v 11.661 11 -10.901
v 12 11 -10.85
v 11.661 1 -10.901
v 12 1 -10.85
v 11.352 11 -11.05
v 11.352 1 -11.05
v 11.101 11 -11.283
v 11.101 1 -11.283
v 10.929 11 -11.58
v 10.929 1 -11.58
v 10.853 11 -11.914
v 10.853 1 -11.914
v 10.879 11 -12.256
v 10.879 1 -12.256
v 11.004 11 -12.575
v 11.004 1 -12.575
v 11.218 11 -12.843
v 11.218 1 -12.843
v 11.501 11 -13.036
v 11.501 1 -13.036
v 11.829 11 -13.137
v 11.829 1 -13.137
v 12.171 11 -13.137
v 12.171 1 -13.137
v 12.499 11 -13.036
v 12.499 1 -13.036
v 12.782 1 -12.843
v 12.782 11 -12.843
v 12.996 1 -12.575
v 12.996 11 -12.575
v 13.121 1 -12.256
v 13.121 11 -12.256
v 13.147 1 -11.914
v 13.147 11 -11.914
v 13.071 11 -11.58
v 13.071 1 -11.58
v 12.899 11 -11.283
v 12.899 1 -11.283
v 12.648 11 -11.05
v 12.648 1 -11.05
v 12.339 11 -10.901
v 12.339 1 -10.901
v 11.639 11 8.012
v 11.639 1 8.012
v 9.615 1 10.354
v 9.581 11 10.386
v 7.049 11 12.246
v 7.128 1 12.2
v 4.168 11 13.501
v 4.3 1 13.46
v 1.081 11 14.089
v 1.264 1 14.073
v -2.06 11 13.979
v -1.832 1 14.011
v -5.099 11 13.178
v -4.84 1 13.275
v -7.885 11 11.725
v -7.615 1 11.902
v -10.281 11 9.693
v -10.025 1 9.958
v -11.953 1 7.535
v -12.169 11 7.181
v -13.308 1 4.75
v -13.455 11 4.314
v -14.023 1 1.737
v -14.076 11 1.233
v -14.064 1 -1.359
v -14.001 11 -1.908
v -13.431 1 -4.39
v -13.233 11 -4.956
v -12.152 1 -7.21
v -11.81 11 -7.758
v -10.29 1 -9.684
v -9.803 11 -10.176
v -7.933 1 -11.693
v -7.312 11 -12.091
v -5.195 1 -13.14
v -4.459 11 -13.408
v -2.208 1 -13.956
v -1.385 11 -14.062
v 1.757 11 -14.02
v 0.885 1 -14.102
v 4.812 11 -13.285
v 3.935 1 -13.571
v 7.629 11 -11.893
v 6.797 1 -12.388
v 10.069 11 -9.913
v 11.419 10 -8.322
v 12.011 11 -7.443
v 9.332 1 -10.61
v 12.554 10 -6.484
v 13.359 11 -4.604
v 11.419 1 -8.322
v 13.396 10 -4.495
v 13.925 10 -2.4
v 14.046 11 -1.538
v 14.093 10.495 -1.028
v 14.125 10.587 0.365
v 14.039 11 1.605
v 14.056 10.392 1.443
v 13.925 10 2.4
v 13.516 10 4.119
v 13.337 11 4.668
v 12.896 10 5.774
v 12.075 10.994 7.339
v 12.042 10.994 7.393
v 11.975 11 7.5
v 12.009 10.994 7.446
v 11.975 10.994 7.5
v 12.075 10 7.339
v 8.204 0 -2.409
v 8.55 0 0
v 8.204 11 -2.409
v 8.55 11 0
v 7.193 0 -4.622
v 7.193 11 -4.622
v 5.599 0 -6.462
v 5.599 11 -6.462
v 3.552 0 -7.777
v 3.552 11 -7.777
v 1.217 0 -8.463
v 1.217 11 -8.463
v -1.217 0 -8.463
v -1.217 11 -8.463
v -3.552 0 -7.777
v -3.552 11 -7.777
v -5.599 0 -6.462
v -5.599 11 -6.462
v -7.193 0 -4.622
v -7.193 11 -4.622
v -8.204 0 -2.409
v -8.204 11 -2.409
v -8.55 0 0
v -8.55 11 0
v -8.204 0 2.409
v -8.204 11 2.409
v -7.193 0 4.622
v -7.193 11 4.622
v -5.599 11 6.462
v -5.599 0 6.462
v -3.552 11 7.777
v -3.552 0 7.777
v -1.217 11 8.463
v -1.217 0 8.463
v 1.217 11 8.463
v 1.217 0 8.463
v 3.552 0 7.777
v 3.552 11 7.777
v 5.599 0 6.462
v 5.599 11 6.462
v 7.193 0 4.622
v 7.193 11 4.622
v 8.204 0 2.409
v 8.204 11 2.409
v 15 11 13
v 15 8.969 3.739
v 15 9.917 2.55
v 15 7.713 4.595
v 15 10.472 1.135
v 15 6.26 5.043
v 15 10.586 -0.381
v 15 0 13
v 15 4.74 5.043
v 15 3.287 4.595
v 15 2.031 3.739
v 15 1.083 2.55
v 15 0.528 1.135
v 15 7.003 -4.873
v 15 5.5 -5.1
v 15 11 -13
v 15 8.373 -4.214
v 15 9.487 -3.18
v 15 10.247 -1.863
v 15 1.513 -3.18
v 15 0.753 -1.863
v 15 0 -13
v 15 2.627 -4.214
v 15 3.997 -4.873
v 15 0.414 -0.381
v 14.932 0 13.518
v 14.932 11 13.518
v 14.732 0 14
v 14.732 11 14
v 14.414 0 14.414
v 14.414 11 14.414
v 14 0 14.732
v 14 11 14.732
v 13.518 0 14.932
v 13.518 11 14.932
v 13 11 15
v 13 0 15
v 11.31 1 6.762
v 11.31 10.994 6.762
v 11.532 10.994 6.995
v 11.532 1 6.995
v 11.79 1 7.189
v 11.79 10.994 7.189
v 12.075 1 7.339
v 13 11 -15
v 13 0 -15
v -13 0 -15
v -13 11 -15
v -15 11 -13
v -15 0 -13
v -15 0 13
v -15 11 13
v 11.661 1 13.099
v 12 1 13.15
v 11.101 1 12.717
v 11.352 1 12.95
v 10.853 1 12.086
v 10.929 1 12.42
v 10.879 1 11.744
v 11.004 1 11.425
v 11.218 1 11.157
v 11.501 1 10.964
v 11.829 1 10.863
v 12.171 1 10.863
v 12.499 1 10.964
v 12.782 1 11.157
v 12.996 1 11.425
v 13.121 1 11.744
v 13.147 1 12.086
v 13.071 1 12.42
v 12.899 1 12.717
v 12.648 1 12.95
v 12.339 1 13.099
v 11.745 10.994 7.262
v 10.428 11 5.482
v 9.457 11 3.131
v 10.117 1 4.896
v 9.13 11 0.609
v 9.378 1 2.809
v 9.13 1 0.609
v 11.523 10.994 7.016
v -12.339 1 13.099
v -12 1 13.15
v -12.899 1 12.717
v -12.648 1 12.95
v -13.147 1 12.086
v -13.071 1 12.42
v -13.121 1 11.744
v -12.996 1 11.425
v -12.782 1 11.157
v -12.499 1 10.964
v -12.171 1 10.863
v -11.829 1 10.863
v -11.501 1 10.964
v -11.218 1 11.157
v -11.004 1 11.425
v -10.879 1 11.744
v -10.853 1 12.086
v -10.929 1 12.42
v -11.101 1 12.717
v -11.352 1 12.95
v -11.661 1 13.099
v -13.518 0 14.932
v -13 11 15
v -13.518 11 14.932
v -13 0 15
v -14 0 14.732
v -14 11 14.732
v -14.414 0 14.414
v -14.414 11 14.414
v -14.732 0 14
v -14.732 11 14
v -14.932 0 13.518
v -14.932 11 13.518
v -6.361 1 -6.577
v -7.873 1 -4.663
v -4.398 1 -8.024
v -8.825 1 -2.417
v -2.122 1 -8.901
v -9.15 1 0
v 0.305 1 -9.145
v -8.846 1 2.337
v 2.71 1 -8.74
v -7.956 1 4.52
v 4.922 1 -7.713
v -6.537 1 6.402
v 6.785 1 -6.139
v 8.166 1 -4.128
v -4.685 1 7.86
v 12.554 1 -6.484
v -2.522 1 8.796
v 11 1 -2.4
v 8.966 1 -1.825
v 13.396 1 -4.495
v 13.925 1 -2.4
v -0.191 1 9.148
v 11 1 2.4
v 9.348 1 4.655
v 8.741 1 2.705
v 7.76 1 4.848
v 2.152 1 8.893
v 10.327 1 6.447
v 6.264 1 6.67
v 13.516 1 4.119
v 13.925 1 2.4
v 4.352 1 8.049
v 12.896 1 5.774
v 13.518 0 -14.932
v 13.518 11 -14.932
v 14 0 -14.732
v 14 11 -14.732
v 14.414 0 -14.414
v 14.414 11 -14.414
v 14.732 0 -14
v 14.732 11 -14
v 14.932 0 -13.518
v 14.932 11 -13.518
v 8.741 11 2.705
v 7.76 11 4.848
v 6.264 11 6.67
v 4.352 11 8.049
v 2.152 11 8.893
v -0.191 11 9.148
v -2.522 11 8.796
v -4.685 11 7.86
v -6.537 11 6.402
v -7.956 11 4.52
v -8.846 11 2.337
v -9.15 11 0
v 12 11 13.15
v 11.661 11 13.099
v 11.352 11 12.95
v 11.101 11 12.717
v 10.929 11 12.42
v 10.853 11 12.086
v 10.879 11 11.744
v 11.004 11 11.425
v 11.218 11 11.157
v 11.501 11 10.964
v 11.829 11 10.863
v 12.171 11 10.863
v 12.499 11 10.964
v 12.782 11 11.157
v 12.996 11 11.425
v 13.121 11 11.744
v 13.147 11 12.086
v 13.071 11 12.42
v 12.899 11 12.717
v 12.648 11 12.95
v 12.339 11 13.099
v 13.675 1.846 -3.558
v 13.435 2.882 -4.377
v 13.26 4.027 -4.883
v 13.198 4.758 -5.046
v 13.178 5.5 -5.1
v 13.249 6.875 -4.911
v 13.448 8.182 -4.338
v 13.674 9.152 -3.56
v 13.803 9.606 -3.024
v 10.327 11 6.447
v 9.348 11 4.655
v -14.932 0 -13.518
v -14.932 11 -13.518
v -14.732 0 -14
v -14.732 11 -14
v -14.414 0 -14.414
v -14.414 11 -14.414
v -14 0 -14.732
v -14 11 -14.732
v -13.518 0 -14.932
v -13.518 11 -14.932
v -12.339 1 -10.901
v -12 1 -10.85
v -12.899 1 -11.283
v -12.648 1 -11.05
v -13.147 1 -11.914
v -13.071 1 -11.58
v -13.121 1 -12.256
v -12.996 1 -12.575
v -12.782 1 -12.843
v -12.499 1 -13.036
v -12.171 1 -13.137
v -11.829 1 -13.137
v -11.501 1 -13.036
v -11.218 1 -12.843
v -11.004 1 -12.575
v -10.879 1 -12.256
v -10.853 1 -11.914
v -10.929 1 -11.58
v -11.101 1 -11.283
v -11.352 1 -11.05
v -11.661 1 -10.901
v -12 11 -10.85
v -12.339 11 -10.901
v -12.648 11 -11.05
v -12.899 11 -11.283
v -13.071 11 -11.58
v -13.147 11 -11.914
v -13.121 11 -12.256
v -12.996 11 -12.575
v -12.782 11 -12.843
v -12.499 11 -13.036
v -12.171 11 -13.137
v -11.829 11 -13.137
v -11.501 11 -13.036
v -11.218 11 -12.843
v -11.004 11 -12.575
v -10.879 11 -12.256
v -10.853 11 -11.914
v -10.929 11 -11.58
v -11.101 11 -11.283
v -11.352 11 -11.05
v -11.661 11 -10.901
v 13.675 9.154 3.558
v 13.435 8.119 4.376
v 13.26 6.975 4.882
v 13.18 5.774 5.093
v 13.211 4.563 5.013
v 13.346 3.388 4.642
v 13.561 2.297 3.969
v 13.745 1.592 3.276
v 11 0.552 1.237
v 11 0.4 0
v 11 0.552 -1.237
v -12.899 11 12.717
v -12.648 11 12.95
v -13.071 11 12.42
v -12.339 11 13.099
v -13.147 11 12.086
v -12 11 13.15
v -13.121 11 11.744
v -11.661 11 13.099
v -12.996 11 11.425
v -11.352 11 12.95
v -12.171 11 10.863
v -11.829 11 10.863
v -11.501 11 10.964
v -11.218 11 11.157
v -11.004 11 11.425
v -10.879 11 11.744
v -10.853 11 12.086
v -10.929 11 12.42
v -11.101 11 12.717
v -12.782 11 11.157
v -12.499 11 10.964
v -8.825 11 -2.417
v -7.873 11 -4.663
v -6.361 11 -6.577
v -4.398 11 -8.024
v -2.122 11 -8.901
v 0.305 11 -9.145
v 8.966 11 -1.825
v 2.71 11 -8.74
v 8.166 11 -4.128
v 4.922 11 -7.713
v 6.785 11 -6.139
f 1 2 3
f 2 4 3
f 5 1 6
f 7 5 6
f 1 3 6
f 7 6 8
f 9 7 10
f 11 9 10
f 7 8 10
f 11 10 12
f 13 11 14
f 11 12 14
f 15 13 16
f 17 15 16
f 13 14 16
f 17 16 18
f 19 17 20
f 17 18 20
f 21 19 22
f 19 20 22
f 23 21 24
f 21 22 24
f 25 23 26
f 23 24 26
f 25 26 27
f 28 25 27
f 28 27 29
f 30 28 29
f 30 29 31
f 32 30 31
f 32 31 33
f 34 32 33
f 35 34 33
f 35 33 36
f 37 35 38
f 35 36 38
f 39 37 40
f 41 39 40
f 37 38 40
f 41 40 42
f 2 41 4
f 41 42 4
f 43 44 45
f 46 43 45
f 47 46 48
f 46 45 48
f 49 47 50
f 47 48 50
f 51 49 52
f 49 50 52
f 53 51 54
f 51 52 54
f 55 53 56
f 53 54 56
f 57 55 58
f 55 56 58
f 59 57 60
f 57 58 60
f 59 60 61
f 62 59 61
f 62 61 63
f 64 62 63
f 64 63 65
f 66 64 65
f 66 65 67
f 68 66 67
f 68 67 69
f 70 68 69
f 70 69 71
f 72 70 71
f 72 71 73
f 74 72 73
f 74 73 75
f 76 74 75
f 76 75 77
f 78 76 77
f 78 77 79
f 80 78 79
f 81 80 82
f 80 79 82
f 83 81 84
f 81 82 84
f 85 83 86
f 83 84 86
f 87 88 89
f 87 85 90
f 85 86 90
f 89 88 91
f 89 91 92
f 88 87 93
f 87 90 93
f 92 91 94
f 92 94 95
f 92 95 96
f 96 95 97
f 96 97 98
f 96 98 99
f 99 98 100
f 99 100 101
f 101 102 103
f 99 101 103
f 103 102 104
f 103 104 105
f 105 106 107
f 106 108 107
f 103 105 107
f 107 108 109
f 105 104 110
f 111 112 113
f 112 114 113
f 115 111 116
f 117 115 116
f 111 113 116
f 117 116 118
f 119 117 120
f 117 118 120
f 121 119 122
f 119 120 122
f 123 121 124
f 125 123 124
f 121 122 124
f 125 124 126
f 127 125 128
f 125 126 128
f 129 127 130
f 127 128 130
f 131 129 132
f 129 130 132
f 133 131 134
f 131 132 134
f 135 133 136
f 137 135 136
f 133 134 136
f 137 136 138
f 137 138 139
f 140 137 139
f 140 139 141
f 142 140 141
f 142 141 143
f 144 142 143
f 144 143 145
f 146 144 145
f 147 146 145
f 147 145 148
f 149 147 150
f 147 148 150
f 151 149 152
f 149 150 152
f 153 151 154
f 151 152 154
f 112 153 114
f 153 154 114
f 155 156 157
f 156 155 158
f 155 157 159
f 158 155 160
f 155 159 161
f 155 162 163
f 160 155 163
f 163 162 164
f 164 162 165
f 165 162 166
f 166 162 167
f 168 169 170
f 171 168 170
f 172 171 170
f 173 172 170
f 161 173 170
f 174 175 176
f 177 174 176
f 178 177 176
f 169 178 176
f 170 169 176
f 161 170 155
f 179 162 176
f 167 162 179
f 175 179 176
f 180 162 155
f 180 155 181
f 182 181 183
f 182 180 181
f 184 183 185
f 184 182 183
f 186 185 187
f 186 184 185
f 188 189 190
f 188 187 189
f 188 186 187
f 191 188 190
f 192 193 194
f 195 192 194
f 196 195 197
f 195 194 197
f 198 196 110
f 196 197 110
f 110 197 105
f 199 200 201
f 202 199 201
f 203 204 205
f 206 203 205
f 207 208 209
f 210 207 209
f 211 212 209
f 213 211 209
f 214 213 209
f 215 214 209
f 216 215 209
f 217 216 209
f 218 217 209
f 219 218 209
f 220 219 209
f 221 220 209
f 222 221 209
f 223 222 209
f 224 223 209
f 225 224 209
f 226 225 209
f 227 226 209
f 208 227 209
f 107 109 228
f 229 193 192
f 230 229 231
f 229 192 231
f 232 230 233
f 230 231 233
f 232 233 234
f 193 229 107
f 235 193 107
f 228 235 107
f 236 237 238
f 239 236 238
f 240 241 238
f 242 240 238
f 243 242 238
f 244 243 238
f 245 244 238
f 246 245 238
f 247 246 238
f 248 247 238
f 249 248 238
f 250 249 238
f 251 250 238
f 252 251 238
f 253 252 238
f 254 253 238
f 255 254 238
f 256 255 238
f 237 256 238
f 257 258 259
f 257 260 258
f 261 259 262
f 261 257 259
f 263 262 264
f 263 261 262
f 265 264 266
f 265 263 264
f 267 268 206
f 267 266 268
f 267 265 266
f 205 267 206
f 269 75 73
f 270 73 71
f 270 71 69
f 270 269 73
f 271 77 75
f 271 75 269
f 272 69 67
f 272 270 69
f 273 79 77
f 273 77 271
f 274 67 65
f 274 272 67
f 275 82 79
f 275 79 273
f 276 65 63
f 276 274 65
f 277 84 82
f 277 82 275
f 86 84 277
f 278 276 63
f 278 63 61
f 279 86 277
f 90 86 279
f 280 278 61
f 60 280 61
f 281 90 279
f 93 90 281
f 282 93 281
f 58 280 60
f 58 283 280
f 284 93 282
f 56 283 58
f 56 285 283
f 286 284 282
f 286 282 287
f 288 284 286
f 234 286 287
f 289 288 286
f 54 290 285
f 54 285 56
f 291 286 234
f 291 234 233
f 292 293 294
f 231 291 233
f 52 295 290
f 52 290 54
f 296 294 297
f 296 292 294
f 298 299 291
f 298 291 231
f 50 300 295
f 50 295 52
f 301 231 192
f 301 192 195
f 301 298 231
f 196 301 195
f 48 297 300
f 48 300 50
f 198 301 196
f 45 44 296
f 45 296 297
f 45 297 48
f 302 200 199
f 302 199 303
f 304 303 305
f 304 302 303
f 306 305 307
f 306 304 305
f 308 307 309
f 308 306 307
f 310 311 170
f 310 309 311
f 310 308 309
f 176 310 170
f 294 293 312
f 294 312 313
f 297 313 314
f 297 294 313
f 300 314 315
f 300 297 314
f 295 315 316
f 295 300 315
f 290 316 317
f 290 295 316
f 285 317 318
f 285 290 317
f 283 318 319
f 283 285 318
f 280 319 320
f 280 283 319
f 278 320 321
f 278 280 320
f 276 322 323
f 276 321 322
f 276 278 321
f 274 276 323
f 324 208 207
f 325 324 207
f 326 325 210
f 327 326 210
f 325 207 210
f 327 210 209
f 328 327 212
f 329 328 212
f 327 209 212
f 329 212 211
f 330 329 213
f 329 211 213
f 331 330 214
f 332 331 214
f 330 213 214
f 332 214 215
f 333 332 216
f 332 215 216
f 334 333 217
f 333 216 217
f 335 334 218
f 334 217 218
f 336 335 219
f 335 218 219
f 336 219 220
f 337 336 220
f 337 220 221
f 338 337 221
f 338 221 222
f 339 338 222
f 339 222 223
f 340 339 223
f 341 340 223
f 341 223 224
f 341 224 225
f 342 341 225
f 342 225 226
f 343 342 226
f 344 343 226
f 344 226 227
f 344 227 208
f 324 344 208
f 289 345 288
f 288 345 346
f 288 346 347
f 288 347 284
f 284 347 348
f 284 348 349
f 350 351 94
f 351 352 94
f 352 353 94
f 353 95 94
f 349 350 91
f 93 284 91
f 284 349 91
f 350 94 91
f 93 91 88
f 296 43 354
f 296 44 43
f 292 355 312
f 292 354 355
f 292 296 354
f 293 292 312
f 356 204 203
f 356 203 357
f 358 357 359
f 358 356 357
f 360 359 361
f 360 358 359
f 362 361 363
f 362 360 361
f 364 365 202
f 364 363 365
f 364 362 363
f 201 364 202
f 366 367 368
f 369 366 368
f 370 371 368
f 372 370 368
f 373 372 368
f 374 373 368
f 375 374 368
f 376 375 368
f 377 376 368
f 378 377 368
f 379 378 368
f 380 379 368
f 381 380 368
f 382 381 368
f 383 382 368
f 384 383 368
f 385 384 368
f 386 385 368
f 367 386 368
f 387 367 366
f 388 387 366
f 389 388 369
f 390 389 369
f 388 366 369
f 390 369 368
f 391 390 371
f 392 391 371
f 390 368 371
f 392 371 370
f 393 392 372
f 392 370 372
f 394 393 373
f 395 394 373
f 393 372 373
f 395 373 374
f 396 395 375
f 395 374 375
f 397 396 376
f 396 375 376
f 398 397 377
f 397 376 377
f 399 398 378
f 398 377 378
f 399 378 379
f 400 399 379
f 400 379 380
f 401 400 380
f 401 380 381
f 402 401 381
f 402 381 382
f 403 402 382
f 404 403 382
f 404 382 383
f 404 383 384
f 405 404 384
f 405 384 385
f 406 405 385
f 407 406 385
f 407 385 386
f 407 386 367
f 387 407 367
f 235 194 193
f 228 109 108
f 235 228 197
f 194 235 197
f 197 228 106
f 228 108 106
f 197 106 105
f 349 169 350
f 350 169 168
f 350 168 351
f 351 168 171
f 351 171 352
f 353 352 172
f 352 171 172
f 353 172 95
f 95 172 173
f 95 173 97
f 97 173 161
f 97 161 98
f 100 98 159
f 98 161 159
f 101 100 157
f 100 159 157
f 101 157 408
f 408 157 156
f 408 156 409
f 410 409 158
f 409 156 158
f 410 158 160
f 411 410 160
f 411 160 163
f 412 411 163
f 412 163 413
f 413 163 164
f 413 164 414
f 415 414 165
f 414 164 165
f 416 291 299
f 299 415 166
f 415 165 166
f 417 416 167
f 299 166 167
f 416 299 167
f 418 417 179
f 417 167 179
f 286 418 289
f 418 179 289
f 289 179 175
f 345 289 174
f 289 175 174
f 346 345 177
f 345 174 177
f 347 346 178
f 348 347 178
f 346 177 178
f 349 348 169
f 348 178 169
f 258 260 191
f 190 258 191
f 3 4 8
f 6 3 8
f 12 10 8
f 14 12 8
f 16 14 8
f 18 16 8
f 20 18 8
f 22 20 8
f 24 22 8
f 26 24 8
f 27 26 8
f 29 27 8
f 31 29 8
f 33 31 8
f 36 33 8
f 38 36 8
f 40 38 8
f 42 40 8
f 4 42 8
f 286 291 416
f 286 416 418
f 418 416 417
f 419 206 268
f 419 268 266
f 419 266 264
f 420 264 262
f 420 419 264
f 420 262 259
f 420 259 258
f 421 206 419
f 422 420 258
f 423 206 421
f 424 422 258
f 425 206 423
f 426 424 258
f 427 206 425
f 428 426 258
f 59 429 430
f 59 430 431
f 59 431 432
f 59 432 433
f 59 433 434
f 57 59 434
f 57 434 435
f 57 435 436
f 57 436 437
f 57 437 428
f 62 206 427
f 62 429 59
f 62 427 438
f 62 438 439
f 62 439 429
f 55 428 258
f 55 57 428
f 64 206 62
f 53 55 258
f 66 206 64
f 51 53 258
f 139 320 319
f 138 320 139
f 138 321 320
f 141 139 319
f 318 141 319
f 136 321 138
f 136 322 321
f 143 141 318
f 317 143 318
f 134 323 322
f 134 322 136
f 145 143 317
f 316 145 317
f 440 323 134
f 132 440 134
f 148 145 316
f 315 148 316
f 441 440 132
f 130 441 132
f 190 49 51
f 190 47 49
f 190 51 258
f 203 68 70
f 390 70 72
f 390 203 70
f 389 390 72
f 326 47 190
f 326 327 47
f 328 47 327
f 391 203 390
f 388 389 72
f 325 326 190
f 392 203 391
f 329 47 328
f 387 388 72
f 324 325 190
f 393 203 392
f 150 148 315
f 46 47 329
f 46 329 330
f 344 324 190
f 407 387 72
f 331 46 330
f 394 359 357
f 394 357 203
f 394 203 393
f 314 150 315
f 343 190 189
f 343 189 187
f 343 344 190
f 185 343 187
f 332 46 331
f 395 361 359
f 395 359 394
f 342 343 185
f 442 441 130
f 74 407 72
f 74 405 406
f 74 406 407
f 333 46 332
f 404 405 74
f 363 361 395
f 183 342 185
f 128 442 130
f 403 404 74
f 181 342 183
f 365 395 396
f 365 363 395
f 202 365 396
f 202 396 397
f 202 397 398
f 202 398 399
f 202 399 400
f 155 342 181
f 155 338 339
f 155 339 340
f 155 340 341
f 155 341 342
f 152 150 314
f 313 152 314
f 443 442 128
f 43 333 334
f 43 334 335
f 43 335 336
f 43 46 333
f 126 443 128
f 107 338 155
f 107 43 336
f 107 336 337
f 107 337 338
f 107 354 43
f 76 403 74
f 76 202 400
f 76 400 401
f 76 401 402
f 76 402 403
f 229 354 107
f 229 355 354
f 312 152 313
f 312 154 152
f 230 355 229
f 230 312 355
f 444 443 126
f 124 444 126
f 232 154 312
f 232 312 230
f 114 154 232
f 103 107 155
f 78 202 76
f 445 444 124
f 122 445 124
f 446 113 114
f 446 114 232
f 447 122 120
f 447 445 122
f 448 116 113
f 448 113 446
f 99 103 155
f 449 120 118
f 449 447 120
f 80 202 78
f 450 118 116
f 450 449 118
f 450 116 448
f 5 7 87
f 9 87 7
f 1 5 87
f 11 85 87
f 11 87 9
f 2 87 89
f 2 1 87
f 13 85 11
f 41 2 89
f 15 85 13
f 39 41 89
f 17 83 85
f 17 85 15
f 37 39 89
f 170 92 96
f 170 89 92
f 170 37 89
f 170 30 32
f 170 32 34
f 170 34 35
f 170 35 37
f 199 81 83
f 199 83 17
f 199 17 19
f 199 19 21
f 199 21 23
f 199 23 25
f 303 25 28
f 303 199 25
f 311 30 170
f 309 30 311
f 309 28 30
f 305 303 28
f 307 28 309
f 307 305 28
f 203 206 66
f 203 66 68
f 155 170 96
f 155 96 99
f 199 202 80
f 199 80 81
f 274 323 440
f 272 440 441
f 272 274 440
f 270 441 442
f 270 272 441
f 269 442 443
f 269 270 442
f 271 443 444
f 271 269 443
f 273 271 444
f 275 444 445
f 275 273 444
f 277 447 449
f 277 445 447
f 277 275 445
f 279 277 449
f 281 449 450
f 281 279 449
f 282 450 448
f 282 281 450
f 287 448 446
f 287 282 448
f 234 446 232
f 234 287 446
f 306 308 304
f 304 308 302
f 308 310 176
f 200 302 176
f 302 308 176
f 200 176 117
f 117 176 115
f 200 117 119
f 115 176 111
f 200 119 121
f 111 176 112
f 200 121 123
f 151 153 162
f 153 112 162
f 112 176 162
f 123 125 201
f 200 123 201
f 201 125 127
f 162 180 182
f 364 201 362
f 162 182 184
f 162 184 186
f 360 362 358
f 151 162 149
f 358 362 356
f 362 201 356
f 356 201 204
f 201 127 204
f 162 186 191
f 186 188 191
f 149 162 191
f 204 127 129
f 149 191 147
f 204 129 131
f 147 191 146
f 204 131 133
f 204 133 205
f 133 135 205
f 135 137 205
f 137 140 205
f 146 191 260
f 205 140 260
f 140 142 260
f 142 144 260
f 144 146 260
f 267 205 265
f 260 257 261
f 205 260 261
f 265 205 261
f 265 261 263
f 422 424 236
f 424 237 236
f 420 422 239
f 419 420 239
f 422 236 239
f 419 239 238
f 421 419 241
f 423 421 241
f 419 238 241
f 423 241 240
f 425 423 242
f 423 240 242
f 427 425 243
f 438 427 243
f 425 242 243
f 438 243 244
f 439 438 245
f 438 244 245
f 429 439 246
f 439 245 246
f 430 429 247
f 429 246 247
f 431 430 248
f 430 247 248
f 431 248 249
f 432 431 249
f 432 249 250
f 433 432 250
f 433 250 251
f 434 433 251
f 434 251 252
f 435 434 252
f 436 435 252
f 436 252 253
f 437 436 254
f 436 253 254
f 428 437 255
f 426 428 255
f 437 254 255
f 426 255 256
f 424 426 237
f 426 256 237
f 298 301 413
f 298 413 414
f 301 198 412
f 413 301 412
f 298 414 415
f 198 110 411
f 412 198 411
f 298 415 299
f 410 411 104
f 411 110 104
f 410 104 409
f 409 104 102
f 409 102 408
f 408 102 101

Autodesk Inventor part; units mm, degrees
ref_plane "YZ Plane" through (0, 0, 0) normal (1, 0, 0) x (0, 1, 0)
ref_plane "XZ Plane" through (0, 0, 0) normal (0, 1, 0) x (-1, 0, 0)
ref_plane "XY Plane" through (0, 0, 0) normal (0, 0, 1) x (1, 0, 0)
sketch "Sketch1" plane through (0, 0, 0) normal (0, 1, 0) x (-1, 0, 0)
  line L0 (13, 15) -> (-13, 15)
  line L1 (-15, 13) -> (-15, -13)
  line L2 (-13, -15) -> (13, -15)
  line L3 (15, -13) -> (15, 13)
  line L4 (15, 15) -> (-15, -15) construction
  line L5 (-15, 15) -> (15, -15) construction
  circle A0 centre (0, 0) radius 9.15
  circle A1 centre (0, 0) radius 14.13
  arc A2 (15, 13) -> (13, 15) centre (13, 13) ccw
  arc A3 (13, -15) -> (15, -13) centre (13, -13) ccw
  arc A4 (-15, -13) -> (-13, -15) centre (-13, -13) ccw
  arc A5 (-13, 15) -> (-15, 13) centre (-13, 13) ccw
  dimension "d0" = 30
  dimension "d1" = 30
  dimension "d2" = 18.3
  dimension "d3" = 28.26
  dimension "d4" = 2
extrude "Extrusion1" add sketch "Sketch1" along normal blind 11
sketch "Sketch2" plane through (0, 0, 0) normal (0, -1, 0) x (1, 0, 0)
  line L0 (-15, -13) -> (-15, 13) projected
  arc A0 (-13, 15) -> (-15, 13) centre (-13, 13) ccw projected
  line L1 (-13, 15) -> (13, 15) projected
  arc A1 (15, 13) -> (13, 15) centre (13, 13) ccw projected
  line L2 (15, 13) -> (15, -13) projected
  arc A2 (13, -15) -> (15, -13) centre (13, -13) ccw projected
  line L3 (13, -15) -> (-13, -15) projected
  arc A3 (-15, -13) -> (-13, -15) centre (-13, -13) ccw projected
  point P0 (0, 0)
extrude "Extrusion2" add sketch "Sketch2" against normal blind 1
sketch "Sketch3" plane through (0, 11, 0) normal (0, 1, 0) x (1, 0, 0)
  circle A0 centre (0, 0) radius 9.15 projected
  circle A1 centre (0, 0) radius 8.55
  dimension "d9" = 0.6
extrude "Extrusion3" cut sketch "Sketch3" against normal through all contours A1
sketch "Sketch4" plane through (0, 11, 0) normal (0, 1, 0) x (1, 0, 0)
  circle A0 centre (0, 0) radius 14.13 construction
  line L0 (-13, -15) -> (13, -15) construction
  arc A1 (13, -15) -> (15, -13) centre (13, -13) ccw construction
  line L1 (15, -13) -> (15, 13) construction
  arc A2 (15, 13) -> (13, 15) centre (13, 13) ccw construction
  line L2 (13, 15) -> (-13, 15) construction
  arc A3 (-13, 15) -> (-15, 13) centre (-13, 13) ccw construction
  line L3 (-15, 13) -> (-15, -13) construction
  arc A4 (-15, -13) -> (-13, -15) centre (-13, -13) ccw construction
  line L4 (-12, -12) -> (12, -12) construction
  line L5 (12, -12) -> (12, 12) construction
  line L6 (12, 12) -> (-12, 12) construction
  line L7 (-12, 12) -> (-12, -12) construction
  line L8 (-12, -12) -> (12, 12) construction
  line L9 (12, -12) -> (-12, 12) construction
  point P0 (0, 0)
  dimension "d12" = 24
  dimension "d13" = 24
hole "Hole1" at (-12, 11, 12) at (-12, 11, -12) at (12, 11, -12) at (12, 11, 12) direction (0, -1, 0) diameter 2.3 depth 10
sketch "Sketch5" plane through (15, 0, -13) normal (1, 0, 0) x (0, 0, -1)
  line L0 (0, 0) -> (0, 11) construction
  line L1 (-26, 11) -> (0, 11) construction
  line L2 (-26, 0) -> (-26, 11) construction
  line L3 (-26, 0) -> (0, 0) construction
  line L4 (-20.5, 10) -> (-5.5, 10)
  line L5 (-5.5, 10) -> (-5.5, 1)
  line L6 (-5.5, 1) -> (-20.5, 1)
  line L7 (-20.5, 1) -> (-20.5, 10)
  line L8 (-20.5, 10) -> (-5.5, 1) construction
  line L9 (-5.5, 10) -> (-20.5, 1) construction
  point P0 (-13, 0)
  point P1 (-13, 5.5)
  dimension "d21" = 15
  dimension "d22" = 9
extrude "Extrusion4" cut sketch "Sketch5" against normal blind 4
sketch "Sketch6" plane through (0, 1, 0) normal (0, 1, 0) x (1, 0, 0)
  line L0 (15, -7.5) -> (11.9753, -7.5) construction
  arc A0 (8.7409, -2.7053) -> (9.1297, -0.6089) centre (0, 0) ccw
  arc A1 (9.1297, -0.6089) -> (11.9753, -7.5) centre (18.8506, -0.6279) ccw
  arc A2 (8.7409, -2.7053) -> (11.6393, -8.0115) centre (18.8506, -0.6279) ccw
  arc A3 (11.6393, -8.0115) -> (11.9753, -7.5) centre (0, 0) ccw
  arc A4 (11.6393, -8.0115) -> (11.9753, -7.5) centre (0, 0) ccw
  dimension "d25" = 0.6
extrude "Extrusion5" add sketch "Sketch6" along normal up to surface (10 mm away)
fillet "Fillet1" radius 2 2 edges at (11.9753, 5.5, 7.5) (11.9753, 5.5, -7.5)
sketch "Sketch12" plane through (15, 10, -7.5) normal (0, -1, 0) x (1, 0, 0)
  arc A0 (-2.139, 15) -> (-2.9253, 14.8389) centre (-2.139, 13) ccw projected
  arc A1 (-3.5807, -0.8221) -> (-2.9253, 14.8389) centre (-15, 7.5) ccw projected
  arc A2 (-1.9644, 0) -> (-3.5807, -0.8221) centre (-1.9644, -2) ccw projected
  line L0 (0, 0) -> (-1.9644, 0) projected
  line L1 (0, 15) -> (0, 0) projected
  line L2 (0, 15) -> (-2.139, 15) projected
extrude "Extrusion10" add sketch "Sketch12" along normal up to surface (9 mm away)
sketch "Sketch13" plane through (15, 0, -13) normal (1, 0, 0) x (0, 0, -1)
  line L0 (0, 0) -> (0, 11) construction
  line L1 (-26, 11) -> (0, 11) construction
  line L2 (-26, 0) -> (-26, 11) construction
  line L3 (-26, 0) -> (0, 0) construction
  circle A0 centre (-13, 5.5) radius 5.1
  point P0 (-13, 0)
  dimension "d44" = 10.2
extrude "Extrusion11" cut sketch "Sketch13" against normal blind 4
sketch "Sketch8" plane through (20, 0, -13) normal (1, 0, 0) x (0, 0, -1)
  line L0 (-20.5, 10) -> (-5.5, 10) projected
  line L1 (-20.5, 1) -> (-20.5, 10) projected
  line L2 (-5.5, 1) -> (-20.5, 1) projected
  line L3 (-5.5, 10) -> (-5.5, 1) projected
  line L4 (-20.3, 9.8) -> (-5.7, 9.8)
  line L5 (-5.7, 9.8) -> (-5.7, 1.2)
  line L6 (-5.7, 1.2) -> (-20.3, 1.2)
  line L7 (-20.3, 1.2) -> (-20.3, 9.8)
  point P0 (-13, 0)
  dimension "d30" = 0.2
  dimension "d33" = 1
  dimension "d34" = 0.6
sketch "Sketch11" plane through (22.6, 0, -13) normal (1, 0, 0) x (0, 0, -1)
  line L0 (-21.3, 10.8) -> (-21.3, 0.2) construction
  line L1 (-21.3, 0.2) -> (-4.7, 0.2) construction
  line L2 (-4.7, 0.2) -> (-4.7, 10.8) construction
  line L3 (-4.7, 10.8) -> (-21.3, 10.8) construction
  circle A0 centre (-13, 5.5) radius 5.125
  point P0 (-13, 0)
  dimension "d39" = 10.25
properties part number "base2"
